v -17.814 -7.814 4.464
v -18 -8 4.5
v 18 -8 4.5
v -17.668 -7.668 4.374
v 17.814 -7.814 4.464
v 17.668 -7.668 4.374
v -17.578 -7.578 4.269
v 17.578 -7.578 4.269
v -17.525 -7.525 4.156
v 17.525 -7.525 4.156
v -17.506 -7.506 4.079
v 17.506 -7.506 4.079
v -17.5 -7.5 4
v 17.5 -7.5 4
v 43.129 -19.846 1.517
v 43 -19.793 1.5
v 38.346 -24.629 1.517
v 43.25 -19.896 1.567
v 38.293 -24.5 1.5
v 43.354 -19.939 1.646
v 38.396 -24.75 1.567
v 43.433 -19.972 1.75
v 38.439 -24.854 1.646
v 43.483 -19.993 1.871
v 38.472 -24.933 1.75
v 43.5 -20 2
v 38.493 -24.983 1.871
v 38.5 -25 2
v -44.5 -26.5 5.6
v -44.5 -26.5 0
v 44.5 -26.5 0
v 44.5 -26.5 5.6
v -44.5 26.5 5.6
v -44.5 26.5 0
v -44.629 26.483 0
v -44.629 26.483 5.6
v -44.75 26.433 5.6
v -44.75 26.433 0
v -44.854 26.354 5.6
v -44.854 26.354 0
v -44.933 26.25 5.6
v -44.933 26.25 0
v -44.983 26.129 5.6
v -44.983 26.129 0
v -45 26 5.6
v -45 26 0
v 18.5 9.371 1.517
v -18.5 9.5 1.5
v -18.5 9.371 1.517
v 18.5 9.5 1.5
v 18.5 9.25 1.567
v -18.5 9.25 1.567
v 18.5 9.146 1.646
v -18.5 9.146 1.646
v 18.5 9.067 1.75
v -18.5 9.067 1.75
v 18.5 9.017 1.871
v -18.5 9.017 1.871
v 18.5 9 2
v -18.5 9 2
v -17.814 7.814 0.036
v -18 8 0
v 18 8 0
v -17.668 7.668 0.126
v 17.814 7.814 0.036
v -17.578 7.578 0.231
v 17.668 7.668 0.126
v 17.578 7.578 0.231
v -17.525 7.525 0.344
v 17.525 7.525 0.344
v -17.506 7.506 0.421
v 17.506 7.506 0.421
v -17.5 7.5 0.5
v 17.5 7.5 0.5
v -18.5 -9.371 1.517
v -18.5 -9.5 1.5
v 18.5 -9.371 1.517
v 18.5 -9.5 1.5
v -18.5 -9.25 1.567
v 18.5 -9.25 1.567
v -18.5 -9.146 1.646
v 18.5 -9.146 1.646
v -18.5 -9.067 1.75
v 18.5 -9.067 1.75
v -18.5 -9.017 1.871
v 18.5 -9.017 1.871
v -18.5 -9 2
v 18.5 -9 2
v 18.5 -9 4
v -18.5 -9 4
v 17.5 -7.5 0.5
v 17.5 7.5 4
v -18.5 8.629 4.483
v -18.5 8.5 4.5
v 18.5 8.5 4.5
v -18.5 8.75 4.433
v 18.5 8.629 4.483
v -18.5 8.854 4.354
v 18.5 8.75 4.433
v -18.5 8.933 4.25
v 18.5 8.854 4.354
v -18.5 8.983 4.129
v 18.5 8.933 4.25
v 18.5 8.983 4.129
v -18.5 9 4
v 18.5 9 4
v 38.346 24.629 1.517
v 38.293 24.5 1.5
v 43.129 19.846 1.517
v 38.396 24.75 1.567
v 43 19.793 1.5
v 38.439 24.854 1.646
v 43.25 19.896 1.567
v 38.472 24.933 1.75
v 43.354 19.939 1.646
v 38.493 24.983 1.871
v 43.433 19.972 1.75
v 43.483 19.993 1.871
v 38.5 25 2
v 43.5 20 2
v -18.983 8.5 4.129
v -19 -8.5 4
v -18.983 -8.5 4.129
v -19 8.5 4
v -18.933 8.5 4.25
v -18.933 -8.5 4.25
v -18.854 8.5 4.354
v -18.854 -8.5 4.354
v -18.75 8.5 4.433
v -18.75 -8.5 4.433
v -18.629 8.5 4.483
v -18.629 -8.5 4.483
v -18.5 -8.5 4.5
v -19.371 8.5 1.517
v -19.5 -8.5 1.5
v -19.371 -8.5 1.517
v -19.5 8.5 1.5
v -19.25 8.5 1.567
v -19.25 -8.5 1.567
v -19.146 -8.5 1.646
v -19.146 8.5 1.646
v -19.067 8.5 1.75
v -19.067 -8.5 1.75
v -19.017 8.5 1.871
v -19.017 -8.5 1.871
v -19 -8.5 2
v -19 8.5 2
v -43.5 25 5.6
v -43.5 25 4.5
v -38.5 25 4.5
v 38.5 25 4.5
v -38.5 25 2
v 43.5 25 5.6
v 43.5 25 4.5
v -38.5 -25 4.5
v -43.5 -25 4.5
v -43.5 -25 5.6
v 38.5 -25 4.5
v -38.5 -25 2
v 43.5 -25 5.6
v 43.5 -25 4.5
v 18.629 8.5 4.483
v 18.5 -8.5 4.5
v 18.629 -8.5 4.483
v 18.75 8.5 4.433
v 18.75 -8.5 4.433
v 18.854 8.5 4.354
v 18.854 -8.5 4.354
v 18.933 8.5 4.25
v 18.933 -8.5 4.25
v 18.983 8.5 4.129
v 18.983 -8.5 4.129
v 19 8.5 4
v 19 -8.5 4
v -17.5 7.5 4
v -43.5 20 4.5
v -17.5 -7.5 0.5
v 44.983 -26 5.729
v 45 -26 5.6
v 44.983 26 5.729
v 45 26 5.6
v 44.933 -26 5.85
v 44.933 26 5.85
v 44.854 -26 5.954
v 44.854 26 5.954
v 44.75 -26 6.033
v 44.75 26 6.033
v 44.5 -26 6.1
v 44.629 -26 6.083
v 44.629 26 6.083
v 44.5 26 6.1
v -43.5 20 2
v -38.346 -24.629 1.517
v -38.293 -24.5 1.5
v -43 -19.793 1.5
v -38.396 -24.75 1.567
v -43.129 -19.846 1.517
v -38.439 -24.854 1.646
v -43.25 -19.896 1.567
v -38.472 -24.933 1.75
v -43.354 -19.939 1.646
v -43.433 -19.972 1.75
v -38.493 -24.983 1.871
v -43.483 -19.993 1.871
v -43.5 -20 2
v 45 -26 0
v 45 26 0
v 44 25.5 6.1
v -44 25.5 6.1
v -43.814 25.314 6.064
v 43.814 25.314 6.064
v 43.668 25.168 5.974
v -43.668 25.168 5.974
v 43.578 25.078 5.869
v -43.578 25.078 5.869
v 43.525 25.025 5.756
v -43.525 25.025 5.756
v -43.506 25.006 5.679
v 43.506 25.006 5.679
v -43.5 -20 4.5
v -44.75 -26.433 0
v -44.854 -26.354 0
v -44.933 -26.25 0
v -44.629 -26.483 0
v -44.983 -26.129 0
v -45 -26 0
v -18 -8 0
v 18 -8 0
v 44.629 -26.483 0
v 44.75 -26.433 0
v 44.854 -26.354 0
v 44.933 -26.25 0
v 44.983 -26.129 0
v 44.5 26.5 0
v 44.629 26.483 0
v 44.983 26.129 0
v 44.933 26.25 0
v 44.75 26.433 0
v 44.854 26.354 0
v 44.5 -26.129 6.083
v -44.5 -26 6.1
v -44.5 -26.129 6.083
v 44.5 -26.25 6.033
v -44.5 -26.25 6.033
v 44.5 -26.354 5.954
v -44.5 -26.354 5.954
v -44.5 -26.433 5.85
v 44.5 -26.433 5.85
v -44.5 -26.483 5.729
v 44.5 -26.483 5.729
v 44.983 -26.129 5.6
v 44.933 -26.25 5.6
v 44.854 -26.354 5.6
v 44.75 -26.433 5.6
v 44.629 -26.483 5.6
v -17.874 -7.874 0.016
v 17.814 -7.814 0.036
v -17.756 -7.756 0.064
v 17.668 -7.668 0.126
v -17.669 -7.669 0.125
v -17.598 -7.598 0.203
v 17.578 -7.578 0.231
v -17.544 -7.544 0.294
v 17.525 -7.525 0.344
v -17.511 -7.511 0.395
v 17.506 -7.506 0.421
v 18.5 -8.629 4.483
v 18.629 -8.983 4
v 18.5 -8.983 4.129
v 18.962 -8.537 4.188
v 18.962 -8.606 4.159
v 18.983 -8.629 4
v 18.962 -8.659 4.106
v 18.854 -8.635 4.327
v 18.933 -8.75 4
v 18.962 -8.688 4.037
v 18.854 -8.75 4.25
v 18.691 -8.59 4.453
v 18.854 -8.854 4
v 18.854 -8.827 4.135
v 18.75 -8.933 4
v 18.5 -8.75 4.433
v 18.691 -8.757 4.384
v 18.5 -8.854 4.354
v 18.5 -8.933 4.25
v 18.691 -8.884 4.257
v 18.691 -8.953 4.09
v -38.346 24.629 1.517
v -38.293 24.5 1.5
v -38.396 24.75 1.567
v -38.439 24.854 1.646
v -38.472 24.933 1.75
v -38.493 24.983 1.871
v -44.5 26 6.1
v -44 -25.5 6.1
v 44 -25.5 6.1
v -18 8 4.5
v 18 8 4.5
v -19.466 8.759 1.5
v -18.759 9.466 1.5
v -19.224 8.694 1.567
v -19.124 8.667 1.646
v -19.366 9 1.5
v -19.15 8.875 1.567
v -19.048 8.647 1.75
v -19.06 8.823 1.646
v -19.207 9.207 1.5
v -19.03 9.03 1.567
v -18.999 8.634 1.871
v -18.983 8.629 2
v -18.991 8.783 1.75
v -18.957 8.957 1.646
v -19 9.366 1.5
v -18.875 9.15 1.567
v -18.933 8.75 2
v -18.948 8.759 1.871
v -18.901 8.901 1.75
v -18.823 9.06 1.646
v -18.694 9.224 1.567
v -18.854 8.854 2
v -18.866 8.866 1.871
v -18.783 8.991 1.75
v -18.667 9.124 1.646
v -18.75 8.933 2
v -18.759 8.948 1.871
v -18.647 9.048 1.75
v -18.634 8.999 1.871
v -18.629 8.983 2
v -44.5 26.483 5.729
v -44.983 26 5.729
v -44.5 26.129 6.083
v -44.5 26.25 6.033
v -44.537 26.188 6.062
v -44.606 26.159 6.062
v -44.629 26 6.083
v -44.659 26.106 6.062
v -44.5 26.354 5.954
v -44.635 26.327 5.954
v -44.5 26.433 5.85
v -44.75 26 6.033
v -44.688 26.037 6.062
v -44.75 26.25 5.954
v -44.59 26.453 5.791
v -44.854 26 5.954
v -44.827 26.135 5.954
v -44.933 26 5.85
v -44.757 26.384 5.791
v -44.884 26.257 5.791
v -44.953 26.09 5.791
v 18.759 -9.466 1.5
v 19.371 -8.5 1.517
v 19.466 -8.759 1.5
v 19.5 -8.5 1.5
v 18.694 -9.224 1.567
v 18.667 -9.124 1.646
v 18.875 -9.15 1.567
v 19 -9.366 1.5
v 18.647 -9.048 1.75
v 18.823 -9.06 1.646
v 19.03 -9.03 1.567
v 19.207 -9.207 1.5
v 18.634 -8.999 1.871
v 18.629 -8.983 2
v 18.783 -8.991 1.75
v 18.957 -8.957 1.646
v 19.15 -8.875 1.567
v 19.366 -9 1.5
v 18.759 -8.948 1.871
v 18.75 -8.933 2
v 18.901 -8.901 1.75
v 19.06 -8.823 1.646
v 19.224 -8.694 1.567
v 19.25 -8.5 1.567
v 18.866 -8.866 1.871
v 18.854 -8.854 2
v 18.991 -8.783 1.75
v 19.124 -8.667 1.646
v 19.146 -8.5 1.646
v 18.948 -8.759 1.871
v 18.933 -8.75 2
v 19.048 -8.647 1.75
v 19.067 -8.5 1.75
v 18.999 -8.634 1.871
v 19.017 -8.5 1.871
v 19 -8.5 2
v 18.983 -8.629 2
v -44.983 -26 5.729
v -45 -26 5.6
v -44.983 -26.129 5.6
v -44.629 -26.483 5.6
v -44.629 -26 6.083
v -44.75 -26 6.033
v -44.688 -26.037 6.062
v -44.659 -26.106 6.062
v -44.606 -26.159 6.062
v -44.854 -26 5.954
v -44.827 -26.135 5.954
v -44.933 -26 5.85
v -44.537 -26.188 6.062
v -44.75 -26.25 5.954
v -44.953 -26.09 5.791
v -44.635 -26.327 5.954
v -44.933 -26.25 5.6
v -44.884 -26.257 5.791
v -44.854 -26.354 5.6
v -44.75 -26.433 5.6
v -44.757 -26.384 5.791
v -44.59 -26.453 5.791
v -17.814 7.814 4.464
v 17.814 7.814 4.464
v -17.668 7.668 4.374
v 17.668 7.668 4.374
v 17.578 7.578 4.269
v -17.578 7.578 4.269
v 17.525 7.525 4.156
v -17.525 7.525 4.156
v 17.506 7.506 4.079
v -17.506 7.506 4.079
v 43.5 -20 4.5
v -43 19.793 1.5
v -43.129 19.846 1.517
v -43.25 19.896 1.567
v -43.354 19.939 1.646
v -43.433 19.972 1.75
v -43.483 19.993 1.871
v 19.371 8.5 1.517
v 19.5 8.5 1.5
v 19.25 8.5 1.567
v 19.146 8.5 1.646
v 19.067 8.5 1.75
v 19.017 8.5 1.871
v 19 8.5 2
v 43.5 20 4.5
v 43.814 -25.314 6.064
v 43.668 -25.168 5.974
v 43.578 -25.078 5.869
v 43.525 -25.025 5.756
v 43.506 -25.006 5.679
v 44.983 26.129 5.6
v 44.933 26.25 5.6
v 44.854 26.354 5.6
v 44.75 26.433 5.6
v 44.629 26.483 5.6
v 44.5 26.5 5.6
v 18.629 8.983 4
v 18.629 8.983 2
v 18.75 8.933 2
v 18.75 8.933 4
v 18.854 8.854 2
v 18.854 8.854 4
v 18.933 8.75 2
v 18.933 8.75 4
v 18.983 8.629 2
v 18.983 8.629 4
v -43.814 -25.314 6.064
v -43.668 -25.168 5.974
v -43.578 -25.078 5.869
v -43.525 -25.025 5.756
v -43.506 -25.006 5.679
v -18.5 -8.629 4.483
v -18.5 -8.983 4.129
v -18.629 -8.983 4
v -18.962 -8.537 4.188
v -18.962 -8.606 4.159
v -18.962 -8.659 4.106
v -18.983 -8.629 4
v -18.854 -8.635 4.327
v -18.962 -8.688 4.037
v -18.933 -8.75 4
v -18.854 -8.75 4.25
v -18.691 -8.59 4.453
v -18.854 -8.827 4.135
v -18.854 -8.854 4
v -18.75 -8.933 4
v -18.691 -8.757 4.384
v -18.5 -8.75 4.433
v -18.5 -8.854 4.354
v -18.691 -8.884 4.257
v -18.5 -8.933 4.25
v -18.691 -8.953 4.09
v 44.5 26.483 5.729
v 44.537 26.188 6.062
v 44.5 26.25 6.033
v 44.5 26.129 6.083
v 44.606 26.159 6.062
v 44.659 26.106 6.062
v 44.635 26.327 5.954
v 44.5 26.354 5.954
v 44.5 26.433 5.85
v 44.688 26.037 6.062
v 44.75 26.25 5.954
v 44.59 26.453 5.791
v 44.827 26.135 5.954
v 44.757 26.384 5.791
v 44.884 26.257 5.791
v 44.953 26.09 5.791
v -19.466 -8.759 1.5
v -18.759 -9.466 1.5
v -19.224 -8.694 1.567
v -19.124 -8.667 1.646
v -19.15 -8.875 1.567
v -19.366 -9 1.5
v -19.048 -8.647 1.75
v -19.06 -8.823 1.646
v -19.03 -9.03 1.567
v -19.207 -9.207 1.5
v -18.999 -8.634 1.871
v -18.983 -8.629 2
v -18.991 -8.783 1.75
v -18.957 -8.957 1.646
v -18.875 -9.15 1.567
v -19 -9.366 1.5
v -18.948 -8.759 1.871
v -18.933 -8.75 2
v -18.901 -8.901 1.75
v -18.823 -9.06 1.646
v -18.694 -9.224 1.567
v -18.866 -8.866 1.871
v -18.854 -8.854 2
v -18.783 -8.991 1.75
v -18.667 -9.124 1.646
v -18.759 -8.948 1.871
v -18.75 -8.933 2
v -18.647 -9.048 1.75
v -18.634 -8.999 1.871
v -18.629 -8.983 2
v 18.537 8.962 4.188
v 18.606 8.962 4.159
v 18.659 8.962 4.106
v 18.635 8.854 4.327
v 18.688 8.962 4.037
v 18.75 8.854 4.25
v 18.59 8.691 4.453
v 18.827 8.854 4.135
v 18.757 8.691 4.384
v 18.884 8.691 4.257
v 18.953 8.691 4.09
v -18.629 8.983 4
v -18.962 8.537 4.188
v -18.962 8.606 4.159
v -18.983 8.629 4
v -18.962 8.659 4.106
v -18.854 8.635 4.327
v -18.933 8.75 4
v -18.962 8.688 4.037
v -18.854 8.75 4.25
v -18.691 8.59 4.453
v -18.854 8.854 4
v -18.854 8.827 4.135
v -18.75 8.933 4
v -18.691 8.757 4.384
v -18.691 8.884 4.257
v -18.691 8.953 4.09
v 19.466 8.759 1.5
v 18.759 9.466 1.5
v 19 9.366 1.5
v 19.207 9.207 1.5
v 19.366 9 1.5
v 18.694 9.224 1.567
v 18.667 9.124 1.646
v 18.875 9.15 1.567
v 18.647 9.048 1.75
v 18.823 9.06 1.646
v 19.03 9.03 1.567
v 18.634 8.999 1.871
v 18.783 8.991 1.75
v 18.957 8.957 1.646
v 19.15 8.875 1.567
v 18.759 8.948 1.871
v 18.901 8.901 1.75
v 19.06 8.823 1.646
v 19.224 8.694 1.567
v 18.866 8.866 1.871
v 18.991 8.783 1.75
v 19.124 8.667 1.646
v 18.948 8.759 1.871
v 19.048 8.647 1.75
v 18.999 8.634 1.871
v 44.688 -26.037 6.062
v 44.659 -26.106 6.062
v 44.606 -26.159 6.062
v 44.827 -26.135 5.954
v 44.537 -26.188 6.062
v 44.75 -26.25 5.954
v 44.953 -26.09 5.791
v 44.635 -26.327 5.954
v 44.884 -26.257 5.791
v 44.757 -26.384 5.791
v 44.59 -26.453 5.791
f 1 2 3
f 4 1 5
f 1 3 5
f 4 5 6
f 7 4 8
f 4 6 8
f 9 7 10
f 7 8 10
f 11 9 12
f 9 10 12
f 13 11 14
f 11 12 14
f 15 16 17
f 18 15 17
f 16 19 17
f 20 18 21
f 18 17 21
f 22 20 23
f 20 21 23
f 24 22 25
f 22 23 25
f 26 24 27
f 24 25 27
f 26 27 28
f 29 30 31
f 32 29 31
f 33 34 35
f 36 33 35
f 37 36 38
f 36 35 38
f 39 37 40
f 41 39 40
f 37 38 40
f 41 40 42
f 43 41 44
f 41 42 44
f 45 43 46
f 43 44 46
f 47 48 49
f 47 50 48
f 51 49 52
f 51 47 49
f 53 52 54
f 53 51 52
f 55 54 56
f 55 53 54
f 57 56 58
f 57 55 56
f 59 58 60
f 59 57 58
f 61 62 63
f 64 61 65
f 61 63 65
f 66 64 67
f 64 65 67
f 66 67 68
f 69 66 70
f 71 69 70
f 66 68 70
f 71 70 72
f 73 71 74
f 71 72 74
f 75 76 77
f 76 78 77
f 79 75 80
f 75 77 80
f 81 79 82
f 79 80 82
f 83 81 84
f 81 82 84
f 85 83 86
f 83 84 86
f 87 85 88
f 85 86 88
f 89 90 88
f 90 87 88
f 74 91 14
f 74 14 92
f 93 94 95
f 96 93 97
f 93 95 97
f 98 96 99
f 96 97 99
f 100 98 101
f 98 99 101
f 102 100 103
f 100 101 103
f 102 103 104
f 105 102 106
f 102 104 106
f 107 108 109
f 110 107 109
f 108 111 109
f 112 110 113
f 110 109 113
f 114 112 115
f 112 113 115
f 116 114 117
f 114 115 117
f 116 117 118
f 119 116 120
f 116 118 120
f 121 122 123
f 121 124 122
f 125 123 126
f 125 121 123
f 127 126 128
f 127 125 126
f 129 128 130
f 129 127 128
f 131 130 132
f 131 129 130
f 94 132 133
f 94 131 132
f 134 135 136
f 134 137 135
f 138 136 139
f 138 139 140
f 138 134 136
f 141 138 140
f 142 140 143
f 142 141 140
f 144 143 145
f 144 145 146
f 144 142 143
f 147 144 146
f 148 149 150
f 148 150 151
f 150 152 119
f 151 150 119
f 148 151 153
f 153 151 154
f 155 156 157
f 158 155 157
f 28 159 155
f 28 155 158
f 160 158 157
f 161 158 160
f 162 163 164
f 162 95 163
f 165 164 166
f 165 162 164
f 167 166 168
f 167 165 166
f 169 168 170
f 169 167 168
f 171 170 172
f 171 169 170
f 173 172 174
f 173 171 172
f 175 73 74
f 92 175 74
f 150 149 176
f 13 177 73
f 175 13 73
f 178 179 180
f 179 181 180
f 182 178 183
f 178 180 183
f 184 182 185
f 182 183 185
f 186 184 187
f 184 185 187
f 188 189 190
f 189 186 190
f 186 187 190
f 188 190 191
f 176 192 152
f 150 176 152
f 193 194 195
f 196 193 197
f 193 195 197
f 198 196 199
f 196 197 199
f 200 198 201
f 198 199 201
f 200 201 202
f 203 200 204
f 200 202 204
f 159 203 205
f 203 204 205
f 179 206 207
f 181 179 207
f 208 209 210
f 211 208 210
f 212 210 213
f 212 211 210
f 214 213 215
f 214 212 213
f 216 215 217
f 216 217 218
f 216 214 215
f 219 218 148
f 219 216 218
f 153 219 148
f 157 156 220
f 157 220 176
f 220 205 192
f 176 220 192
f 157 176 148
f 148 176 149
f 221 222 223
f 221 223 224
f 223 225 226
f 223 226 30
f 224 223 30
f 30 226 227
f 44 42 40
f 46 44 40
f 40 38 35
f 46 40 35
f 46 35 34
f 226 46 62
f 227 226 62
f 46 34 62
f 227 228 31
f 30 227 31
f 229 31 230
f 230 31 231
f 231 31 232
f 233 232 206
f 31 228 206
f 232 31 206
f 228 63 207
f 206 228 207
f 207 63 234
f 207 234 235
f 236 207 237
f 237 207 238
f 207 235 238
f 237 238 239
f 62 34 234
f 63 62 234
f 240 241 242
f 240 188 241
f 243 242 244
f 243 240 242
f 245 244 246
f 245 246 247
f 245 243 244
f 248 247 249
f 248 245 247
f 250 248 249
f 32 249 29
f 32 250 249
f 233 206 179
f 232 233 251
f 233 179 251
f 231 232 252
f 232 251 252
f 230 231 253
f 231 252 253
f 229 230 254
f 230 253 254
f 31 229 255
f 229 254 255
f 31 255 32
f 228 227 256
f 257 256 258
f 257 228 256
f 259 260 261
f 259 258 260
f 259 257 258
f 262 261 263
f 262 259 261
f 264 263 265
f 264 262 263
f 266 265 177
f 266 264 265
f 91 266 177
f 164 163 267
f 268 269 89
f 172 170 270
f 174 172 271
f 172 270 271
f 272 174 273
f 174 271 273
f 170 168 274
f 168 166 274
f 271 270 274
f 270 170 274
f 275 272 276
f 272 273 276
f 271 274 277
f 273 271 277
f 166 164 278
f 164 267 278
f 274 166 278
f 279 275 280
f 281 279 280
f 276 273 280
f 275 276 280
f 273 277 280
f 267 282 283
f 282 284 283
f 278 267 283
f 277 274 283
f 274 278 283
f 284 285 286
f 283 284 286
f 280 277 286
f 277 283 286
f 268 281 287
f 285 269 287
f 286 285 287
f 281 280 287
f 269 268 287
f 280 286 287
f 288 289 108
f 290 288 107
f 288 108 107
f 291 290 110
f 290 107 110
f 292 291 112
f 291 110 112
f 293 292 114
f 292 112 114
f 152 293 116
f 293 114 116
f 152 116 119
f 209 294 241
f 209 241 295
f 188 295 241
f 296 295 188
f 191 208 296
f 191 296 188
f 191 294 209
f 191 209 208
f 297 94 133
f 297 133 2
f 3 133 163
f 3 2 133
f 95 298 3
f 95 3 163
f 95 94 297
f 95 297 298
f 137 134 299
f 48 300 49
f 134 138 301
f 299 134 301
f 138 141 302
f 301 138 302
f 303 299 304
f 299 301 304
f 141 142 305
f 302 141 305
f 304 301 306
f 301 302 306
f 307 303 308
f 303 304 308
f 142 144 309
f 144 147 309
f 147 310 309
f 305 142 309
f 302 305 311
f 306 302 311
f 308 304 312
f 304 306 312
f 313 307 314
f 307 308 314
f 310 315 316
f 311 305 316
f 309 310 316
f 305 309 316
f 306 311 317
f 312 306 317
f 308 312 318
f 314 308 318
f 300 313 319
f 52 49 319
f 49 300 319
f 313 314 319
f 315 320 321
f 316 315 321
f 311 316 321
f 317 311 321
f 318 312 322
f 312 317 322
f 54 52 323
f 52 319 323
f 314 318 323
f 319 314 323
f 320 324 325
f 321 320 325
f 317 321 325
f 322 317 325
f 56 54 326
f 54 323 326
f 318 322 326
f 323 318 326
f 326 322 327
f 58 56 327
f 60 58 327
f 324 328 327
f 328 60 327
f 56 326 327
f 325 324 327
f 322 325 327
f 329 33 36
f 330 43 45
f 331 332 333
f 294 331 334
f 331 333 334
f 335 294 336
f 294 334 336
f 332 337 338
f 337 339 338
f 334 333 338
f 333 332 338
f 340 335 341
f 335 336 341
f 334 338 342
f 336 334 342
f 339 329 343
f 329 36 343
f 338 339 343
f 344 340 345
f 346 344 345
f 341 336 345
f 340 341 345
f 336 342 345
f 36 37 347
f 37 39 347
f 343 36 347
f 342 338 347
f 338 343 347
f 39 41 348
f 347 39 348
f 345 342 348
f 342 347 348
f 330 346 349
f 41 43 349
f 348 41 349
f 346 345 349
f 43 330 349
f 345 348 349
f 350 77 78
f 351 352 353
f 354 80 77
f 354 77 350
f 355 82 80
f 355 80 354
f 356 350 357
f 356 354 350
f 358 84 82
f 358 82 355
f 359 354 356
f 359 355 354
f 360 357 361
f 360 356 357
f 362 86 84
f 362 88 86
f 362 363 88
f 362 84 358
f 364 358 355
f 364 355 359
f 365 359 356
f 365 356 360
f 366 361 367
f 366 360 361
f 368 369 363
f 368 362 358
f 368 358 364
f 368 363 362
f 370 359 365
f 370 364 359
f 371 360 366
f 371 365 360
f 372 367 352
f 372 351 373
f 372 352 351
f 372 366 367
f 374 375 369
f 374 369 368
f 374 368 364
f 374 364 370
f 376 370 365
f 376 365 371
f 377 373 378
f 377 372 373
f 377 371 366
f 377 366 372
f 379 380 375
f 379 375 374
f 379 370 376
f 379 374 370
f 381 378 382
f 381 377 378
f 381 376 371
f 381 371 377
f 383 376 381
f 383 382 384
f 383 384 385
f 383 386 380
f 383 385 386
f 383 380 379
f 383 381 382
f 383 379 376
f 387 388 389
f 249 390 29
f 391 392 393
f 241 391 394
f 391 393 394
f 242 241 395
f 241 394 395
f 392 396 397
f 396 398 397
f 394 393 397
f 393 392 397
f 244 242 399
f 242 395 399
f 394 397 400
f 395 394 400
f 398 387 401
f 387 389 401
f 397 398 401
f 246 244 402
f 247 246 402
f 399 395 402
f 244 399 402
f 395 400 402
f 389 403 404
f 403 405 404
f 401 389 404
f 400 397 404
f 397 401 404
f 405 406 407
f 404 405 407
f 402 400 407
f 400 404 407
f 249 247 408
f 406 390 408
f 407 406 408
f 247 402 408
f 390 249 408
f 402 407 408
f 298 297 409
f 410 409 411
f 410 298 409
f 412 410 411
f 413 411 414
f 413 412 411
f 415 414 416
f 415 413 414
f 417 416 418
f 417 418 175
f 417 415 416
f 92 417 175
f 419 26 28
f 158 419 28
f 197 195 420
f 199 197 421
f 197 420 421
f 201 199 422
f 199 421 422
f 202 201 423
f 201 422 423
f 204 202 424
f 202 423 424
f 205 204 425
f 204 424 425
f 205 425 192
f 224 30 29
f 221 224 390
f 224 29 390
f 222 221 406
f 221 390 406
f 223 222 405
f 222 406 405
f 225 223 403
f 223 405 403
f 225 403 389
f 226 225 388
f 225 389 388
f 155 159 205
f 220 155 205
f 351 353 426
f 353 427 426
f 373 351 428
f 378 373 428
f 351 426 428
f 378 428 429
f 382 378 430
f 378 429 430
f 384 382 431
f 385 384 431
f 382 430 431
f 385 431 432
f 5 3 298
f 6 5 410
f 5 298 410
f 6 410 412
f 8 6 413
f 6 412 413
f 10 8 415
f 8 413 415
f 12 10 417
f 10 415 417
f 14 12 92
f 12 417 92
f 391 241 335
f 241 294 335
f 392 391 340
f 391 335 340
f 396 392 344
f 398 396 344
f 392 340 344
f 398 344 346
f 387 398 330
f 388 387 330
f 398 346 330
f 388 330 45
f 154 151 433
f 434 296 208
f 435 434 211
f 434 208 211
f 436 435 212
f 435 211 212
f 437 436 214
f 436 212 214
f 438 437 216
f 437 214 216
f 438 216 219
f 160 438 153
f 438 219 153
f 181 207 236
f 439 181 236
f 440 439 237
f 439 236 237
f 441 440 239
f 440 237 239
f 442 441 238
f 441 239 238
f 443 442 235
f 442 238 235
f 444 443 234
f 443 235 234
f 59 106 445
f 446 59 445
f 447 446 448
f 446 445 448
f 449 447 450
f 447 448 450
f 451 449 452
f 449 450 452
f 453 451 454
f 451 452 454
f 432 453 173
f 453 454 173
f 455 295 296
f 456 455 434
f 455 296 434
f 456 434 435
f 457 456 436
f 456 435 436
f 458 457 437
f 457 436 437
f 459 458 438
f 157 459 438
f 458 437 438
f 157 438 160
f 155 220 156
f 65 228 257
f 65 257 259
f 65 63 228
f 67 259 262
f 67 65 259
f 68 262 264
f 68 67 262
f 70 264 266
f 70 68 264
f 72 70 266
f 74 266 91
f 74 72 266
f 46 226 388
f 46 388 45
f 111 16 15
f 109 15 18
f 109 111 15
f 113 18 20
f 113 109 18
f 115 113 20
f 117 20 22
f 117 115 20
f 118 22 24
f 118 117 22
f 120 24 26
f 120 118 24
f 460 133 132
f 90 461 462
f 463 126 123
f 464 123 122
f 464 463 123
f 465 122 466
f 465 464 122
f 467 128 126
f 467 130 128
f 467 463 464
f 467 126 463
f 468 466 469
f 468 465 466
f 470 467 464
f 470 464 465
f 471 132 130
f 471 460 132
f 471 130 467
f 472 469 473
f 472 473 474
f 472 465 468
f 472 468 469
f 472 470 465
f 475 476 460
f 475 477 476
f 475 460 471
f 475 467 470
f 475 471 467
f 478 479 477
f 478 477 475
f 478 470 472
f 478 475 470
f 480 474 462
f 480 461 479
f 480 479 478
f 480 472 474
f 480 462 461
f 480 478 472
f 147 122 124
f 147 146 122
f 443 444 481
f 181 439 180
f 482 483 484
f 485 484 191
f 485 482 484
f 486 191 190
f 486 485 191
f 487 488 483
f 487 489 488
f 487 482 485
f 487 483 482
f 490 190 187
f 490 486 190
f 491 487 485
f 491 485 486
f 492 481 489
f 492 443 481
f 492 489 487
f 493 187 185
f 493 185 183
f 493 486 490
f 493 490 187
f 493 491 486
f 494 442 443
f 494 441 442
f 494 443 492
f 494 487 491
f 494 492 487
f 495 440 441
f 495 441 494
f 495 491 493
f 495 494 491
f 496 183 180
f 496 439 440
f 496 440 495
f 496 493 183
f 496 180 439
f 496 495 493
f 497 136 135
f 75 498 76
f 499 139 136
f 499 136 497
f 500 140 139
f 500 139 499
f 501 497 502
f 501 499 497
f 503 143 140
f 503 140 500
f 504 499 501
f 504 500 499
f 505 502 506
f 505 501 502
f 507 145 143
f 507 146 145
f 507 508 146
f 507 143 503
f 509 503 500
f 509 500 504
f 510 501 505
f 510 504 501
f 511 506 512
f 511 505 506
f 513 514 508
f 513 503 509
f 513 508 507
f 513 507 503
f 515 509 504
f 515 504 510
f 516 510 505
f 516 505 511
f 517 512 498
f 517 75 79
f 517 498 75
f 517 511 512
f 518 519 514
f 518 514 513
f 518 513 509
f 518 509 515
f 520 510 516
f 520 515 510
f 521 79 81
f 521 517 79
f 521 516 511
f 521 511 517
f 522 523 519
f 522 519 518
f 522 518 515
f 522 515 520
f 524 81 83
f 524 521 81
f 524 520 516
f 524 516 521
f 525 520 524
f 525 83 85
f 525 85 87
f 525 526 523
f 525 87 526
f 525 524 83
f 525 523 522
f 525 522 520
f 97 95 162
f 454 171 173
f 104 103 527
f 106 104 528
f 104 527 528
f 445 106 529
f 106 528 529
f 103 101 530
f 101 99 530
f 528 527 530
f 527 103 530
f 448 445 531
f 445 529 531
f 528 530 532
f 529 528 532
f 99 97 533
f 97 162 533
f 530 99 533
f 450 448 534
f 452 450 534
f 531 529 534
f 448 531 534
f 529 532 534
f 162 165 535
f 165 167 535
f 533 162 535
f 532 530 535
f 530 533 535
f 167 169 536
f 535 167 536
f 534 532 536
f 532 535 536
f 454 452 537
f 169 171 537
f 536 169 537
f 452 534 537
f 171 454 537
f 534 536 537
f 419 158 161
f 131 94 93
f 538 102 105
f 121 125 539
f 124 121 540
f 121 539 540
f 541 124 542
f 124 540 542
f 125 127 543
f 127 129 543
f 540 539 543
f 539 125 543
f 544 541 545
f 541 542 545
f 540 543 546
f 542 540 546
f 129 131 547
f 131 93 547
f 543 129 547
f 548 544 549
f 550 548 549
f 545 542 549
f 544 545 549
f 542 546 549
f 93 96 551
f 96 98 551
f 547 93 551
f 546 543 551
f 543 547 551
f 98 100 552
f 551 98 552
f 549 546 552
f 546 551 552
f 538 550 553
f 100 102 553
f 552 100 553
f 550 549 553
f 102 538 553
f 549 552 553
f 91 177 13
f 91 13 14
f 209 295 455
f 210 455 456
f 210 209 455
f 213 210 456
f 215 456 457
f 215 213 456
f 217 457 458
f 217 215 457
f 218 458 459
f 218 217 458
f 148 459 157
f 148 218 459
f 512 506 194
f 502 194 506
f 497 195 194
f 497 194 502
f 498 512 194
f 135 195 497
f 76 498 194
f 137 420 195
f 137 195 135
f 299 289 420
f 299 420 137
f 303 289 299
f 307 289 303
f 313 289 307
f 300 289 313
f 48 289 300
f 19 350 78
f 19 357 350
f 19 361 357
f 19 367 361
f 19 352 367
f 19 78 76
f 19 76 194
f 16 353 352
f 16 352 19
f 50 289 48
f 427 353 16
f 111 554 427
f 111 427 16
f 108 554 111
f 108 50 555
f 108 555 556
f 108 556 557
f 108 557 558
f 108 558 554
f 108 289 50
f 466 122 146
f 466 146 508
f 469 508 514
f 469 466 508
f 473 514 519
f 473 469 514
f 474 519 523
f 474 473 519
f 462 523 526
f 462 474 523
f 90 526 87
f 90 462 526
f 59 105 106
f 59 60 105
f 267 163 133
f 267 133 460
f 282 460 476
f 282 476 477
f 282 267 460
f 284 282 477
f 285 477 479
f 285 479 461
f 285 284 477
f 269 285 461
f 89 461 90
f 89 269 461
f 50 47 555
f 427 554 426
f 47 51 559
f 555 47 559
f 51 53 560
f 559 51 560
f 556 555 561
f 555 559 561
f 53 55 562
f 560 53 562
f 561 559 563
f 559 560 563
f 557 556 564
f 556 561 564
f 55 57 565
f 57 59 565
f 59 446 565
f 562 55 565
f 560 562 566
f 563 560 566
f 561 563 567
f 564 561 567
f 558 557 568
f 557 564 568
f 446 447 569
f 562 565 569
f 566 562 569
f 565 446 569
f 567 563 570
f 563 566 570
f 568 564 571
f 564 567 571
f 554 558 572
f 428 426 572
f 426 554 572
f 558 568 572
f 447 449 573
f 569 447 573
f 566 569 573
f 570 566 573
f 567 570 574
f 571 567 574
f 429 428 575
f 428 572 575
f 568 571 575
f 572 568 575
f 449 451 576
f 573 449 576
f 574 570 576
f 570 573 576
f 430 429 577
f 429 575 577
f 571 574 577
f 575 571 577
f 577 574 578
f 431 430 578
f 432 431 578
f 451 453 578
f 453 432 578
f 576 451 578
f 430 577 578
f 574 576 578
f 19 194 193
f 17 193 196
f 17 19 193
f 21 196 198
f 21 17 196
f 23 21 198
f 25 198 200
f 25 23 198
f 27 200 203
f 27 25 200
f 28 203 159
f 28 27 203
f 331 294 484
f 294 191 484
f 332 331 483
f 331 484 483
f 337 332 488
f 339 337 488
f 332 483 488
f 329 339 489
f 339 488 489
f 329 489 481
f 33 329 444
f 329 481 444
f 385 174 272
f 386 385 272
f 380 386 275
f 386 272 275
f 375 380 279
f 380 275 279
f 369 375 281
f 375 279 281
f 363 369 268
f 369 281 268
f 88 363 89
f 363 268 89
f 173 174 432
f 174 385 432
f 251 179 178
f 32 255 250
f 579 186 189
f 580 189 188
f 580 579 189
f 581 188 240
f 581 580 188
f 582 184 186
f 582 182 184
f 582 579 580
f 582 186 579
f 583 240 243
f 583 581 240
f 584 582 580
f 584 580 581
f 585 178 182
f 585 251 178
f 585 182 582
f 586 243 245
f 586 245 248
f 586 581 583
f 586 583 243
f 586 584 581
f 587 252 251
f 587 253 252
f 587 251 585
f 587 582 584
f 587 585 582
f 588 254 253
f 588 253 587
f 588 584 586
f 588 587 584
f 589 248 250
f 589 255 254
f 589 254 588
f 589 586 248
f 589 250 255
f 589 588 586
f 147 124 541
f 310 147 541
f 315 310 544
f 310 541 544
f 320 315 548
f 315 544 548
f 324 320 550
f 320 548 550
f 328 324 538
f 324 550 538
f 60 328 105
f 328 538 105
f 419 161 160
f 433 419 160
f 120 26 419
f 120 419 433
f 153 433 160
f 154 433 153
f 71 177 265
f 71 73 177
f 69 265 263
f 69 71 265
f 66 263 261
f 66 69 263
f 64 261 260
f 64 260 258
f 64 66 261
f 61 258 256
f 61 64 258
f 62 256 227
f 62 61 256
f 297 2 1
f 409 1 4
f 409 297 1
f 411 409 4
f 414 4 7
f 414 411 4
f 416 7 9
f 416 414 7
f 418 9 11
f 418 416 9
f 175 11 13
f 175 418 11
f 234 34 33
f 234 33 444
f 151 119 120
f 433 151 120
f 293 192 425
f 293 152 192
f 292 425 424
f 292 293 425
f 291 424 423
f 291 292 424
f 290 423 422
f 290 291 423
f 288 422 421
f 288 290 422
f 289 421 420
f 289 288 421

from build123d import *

# Parameters (mm, degrees)
F1_W     = 90
F1_H     = 53
F1_W_2   = 35
F1_H_2   = 15
F2_DEPTH = 1.5
F3_W     = 90
F3_H     = 53
F3_W_2   = 87
F3_H_2   = 50
F4_DEPTH = 4.6
F5_W     = 38
F5_H     = 18
F5_W_2   = 35
F5_H_2   = 15
F6_DEPTH = 3
F7_R     = 0.5


with BuildPart() as f2:
    # F1 (on Top) → F2 (new body)
    with BuildSketch(Plane.XY):
        Rectangle(F1_W, F1_H)
        Rectangle(F1_W_2, F1_H_2, mode=Mode.SUBTRACT)
    extrude(amount=F2_DEPTH)

    # F3 (on face) → F4 (join)
    with BuildSketch(Plane.XY.offset(1.5)):
        Rectangle(F3_W, F3_H)
        Rectangle(F3_W_2, F3_H_2, mode=Mode.SUBTRACT)
    extrude(amount=F4_DEPTH)

    # F5 (on face) → F6 (join)
    with BuildSketch(Plane.XY.offset(1.5)):
        Polygon((-38.5, 25), (-43.5, 25), (-43.5, 20), align=None)
        Polygon((43.5, 20), (43.5, 25), (38.5, 25), align=None)
        Polygon((-43.5, -20), (-43.5, -25), (-38.5, -25), align=None)
        Polygon((38.5, -25), (43.5, -25), (43.5, -20), align=None)
        Rectangle(F5_W, F5_H)
        Rectangle(F5_W_2, F5_H_2, mode=Mode.SUBTRACT)
    extrude(amount=F6_DEPTH)

    # F7
    f7_edges = [f2.edges().sort_by_distance(p)[0] for p in [
        (-45, -26.5, 3.05),
        (45, -26.5, 3.05),
        (45, 26.5, 3.05),
        (-45, 26.5, 3.05),
        (0, 26.5, 6.1),
        (-45, 0, 6.1),
        (45, 0, 6.1),
        (0, -26.5, 6.1),
        (-43.5, 0, 6.1),
        (0, 25, 6.1),
        (43.5, 0, 6.1),
        (0, -25, 6.1),
        (0, -9, 4.5),
        (19, 0, 4.5),
        (0, 7.5, 4.5),
        (0, 9, 4.5),
        (17.5, 0, 4.5),
        (-17.5, 0, 4.5),
        (-19, 0, 4.5),
        (0, 7.5, 0),
        (-17.5, 0, 0),
        (0, -7.5, 0),
        (17.5, 0, 0),
        (-19, -9, 3),
        (-19, 9, 3),
        (-19, 0, 1.5),
        (0, -7.5, 4.5),
        (19, 0, 1.5),
        (19, 9, 3),
        (19, -9, 3),
        (-43.5, 0, 1.5),
        (-41, -22.5, 1.5),
        (-41, 22.5, 1.5),
        (0, 25, 1.5),
        (41, 22.5, 1.5),
        (43.5, 0, 1.5),
        (41, -22.5, 1.5),
        (0, -25, 1.5),
        (0, 9, 1.5),
        (0, -9, 1.5),
    ]]
    fillet(f7_edges, radius=F7_R)


solid = f2.part
